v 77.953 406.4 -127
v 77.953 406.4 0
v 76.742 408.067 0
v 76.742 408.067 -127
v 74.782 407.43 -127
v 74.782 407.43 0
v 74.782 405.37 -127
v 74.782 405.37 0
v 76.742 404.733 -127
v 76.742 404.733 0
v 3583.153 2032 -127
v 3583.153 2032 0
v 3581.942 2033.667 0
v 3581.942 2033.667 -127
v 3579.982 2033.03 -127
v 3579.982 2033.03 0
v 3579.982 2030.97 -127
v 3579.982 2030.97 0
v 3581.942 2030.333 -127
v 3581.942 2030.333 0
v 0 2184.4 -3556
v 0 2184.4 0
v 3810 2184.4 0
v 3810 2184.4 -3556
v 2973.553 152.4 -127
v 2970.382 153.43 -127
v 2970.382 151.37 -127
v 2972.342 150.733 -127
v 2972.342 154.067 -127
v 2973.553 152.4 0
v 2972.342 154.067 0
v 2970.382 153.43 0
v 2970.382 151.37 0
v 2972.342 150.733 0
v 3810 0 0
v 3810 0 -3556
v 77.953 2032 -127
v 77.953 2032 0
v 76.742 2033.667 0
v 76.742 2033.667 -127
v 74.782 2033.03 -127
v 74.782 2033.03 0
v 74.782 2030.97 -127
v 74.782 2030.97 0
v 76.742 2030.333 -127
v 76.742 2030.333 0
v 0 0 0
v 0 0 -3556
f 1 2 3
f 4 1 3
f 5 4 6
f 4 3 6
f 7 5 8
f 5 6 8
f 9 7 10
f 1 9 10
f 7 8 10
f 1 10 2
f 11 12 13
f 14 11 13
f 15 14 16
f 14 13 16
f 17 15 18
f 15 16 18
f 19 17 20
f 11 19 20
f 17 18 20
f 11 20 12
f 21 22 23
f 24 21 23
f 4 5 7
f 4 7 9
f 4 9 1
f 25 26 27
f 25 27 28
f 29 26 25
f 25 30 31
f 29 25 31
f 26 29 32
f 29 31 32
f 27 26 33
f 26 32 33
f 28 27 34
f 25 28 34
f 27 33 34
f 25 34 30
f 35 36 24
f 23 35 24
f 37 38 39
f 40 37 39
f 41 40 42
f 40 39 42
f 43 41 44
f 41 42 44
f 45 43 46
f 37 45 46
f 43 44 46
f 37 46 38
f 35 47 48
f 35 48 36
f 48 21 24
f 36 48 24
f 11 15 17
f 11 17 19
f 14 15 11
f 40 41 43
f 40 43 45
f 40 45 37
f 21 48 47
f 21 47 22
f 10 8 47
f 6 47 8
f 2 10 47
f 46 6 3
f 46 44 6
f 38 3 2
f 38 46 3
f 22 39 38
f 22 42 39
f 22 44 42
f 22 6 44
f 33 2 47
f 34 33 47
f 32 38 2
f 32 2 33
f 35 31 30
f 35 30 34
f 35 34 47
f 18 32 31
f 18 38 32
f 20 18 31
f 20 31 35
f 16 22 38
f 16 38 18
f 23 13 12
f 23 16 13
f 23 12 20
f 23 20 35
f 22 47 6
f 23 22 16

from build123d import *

# Parameters (mm, degrees)
SKETCH_1_W          = 3810
SKETCH_1_H          = 2184.4
EXTRUDE_1_DEPTH     = 3556
SKETCH_1_3_R        = 1.7526
CUT_EXTRUDE_1_DEPTH = 127


with BuildPart() as part:
    # 스케치1 → 보스-돌출1 (new body)
    with BuildSketch(Plane.XY):
        with Locations((1905, 1092.2)):
            Rectangle(SKETCH_1_W, SKETCH_1_H)
    extrude(amount=-EXTRUDE_1_DEPTH)

    # 스케치1<3> → 컷-돌출1 (cut)
    with BuildSketch(Plane.XY):
        with Locations((76.2, 2032)):
            Circle(SKETCH_1_3_R)
        with Locations((3581.4, 2032)):
            Circle(SKETCH_1_3_R)
        with Locations((76.2, 406.4)):
            Circle(SKETCH_1_3_R)
        with Locations((2971.8, 152.4)):
            Circle(SKETCH_1_3_R)
    extrude(amount=-CUT_EXTRUDE_1_DEPTH, mode=Mode.SUBTRACT)


solid = part.part
